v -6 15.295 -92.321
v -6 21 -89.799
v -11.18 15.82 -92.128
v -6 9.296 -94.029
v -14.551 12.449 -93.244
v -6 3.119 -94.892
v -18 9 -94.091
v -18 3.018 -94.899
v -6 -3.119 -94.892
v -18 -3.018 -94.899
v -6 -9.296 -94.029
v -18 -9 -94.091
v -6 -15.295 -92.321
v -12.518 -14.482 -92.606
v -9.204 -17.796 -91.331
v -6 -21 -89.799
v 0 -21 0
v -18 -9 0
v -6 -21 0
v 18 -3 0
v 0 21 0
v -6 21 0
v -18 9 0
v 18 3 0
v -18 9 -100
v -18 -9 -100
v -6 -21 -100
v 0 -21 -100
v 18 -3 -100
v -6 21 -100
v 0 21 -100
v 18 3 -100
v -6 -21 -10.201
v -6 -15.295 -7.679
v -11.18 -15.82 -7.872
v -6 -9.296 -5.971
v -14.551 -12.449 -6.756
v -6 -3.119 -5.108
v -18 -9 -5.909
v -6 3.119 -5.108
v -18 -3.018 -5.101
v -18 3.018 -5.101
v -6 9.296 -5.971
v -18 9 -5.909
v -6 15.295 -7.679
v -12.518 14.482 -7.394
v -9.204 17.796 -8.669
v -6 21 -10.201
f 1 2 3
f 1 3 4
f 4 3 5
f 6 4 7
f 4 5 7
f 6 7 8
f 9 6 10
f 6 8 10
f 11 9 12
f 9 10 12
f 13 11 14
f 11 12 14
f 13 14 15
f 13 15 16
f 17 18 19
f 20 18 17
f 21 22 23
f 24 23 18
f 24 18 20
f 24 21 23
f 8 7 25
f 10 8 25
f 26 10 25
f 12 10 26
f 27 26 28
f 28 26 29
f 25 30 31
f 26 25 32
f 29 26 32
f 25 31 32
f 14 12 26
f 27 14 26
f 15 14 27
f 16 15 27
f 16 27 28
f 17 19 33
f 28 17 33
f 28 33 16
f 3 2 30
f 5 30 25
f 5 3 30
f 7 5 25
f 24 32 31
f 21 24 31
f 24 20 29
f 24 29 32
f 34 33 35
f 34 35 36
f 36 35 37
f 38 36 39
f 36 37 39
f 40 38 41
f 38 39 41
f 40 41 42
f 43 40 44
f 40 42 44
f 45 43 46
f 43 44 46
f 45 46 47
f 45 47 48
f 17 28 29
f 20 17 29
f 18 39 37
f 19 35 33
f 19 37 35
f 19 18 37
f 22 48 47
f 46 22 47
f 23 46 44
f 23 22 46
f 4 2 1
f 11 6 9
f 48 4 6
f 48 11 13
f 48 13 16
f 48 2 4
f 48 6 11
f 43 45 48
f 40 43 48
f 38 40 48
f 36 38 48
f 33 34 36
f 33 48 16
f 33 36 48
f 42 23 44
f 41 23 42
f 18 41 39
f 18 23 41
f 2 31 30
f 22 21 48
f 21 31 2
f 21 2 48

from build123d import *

# Parameters (mm, degrees)
PAD_DEPTH   = 100
SKETCH001_R = 45
HOLE_DEPTH  = 12


with BuildPart() as part:
    # Sketch → Pad (new body)
    with BuildSketch(Plane.XY):
        Polygon((-18, 9), (-18, -9), (-6, -21), (0, -21), (18, -3), (18, 3), (0, 21), (-6, 21), align=None)
    extrude(amount=-PAD_DEPTH)

    # Sketch001 (on Face1 of Pad) → Hole (cut)
    with BuildSketch(Plane(origin=(-18, 0, 0), x_dir=(0, -1, 0), z_dir=(-1, 0, 0))):
        with Locations((0, -50)):
            Circle(SKETCH001_R)
    extrude(amount=-HOLE_DEPTH, mode=Mode.SUBTRACT)


solid = part.part
